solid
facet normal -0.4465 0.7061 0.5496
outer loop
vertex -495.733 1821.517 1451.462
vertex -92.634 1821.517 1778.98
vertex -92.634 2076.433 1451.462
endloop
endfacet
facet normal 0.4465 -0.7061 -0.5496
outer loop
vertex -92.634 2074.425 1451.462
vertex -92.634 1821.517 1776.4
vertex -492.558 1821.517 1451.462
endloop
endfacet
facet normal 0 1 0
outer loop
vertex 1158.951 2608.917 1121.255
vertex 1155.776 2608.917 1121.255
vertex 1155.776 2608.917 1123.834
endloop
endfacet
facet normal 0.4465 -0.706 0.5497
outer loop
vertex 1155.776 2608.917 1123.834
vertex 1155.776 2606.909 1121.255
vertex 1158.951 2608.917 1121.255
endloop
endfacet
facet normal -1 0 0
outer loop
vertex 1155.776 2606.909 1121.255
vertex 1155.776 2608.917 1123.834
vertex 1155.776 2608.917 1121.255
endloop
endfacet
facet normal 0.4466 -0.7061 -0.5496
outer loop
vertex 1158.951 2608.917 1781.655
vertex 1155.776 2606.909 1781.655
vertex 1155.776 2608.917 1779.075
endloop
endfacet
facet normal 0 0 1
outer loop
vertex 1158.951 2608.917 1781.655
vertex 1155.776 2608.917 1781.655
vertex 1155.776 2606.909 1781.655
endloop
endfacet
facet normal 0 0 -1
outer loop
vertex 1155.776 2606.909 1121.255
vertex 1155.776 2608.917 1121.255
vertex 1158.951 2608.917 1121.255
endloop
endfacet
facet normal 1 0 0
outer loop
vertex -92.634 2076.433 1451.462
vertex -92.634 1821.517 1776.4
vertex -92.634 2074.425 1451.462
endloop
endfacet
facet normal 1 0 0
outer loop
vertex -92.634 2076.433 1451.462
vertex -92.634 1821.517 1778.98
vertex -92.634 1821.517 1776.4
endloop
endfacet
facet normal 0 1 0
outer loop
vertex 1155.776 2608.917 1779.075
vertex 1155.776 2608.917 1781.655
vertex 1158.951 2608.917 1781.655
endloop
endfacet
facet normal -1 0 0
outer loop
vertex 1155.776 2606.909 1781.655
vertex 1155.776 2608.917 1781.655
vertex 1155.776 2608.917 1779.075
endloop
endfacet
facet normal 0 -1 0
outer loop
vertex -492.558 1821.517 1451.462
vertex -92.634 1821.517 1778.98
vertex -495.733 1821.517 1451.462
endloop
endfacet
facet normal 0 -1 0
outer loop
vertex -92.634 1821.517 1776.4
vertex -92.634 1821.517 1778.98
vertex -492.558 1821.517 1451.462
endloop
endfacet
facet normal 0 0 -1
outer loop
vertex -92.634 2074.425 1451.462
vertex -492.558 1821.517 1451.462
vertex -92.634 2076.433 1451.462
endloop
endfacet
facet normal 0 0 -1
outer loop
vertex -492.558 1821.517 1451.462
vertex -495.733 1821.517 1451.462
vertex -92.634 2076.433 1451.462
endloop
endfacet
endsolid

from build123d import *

# Parameters (mm, degrees)
SKETCH2_W          = 846.839584843
SKETCH2_H          = 871.457014635
CUT_EXTRUDE2_DEPTH = 1248.41
SKETCH3_W          = 597.069036036
SKETCH3_H          = 378.549018711
CUT_EXTRUDE3_DEPTH = 327.533


with BuildPart() as part:
    # Boss-Extrude1: read off the stored shape, not the designer's step
    # Boss-Extrude1: loft between two sections, ruled curve by curve
    boss_extrude1_from = [
        Edge.make_line((-86.167457674, 1821.517106037, 1121.25455637), (-492.567457674, 1821.517106037, 1451.45455637)),
        Edge.make_line((-492.567457674, 1821.517106037, 1451.45455637), (752.550801769, 2608.917106037, 1451.45455637)),
        Edge.make_line((752.550801769, 2608.917106037, 1451.45455637), (1158.950801769, 2608.917106037, 1121.25455637)),
        Edge.make_line((1158.950801769, 2608.917106037, 1121.25455637), (-86.167457674, 1821.517106037, 1121.25455637)),
    ]
    boss_extrude1_to = [
        Edge.make_line((-89.342457674, 1821.517106037, 1121.25455637), (-495.742457674, 1821.517106037, 1451.45455637)),
        Edge.make_line((-495.742457674, 1821.517106037, 1451.45455637), (749.375801769, 2608.917106037, 1451.45455637)),
        Edge.make_line((749.375801769, 2608.917106037, 1451.45455637), (1155.775801769, 2608.917106037, 1121.25455637)),
        Edge.make_line((1155.775801769, 2608.917106037, 1121.25455637), (-89.342457674, 1821.517106037, 1121.25455637)),
    ]
    boss_extrude1 = Solid(Shell([*[Face.make_surface_from_curves(boss_extrude1_from[k], boss_extrude1_to[k]) for k in range(4)], Face(Wire(boss_extrude1_from)), Face(Wire(boss_extrude1_to))]))
    add(boss_extrude1)

    # Mirror1: Boss-Extrude1 across plane
    add(boss_extrude1.mirror(Plane.XY.offset(1451.45455637)))

    # Sketch2 → Cut-Extrude2 (cut)
    with BuildSketch(Plane(origin=(1155.775801769, 0, 0), x_dir=(0, 0, -1), z_dir=(1, 0, 0))):
        with Locations((-1412.887955953, 2222.276274549)):
            Rectangle(SKETCH2_W, SKETCH2_H)
    extrude(amount=-CUT_EXTRUDE2_DEPTH, mode=Mode.SUBTRACT)


with BuildPart() as cut_extrude2_piece_1:
    # of the separate pieces the step leaves, piece 1, a body of its own (cut_extrude2_pieces)
    add(part.part.solids().sort_by_distance((-92.634198231, 1821.517106037, 1126.508783072))[0])

    # Sketch3 → Cut-Extrude3 (cut)
    with BuildSketch(Plane.XY.offset(1123.929095572)):
        with Locations((-298.534518018, 1946.185413494)):
            Rectangle(SKETCH3_W, SKETCH3_H)
    extrude(amount=CUT_EXTRUDE3_DEPTH, mode=Mode.SUBTRACT)


with BuildPart() as cut_extrude2_piece_2:
    # of the separate pieces the step leaves, piece 2, a body of its own (cut_extrude2_pieces)
    add(part.part.solids().sort_by_distance((1158.950801769, 2608.917106037, 1121.25455637))[0])


with BuildPart() as cut_extrude2_piece_3:
    # of the separate pieces the step leaves, piece 3, a body of its own (cut_extrude2_pieces)
    add(part.part.solids().sort_by_distance((1155.775801769, 2608.917106037, 1779.074868869))[0])


solid = Compound([cut_extrude2_piece_1.part, cut_extrude2_piece_2.part, cut_extrude2_piece_3.part])
